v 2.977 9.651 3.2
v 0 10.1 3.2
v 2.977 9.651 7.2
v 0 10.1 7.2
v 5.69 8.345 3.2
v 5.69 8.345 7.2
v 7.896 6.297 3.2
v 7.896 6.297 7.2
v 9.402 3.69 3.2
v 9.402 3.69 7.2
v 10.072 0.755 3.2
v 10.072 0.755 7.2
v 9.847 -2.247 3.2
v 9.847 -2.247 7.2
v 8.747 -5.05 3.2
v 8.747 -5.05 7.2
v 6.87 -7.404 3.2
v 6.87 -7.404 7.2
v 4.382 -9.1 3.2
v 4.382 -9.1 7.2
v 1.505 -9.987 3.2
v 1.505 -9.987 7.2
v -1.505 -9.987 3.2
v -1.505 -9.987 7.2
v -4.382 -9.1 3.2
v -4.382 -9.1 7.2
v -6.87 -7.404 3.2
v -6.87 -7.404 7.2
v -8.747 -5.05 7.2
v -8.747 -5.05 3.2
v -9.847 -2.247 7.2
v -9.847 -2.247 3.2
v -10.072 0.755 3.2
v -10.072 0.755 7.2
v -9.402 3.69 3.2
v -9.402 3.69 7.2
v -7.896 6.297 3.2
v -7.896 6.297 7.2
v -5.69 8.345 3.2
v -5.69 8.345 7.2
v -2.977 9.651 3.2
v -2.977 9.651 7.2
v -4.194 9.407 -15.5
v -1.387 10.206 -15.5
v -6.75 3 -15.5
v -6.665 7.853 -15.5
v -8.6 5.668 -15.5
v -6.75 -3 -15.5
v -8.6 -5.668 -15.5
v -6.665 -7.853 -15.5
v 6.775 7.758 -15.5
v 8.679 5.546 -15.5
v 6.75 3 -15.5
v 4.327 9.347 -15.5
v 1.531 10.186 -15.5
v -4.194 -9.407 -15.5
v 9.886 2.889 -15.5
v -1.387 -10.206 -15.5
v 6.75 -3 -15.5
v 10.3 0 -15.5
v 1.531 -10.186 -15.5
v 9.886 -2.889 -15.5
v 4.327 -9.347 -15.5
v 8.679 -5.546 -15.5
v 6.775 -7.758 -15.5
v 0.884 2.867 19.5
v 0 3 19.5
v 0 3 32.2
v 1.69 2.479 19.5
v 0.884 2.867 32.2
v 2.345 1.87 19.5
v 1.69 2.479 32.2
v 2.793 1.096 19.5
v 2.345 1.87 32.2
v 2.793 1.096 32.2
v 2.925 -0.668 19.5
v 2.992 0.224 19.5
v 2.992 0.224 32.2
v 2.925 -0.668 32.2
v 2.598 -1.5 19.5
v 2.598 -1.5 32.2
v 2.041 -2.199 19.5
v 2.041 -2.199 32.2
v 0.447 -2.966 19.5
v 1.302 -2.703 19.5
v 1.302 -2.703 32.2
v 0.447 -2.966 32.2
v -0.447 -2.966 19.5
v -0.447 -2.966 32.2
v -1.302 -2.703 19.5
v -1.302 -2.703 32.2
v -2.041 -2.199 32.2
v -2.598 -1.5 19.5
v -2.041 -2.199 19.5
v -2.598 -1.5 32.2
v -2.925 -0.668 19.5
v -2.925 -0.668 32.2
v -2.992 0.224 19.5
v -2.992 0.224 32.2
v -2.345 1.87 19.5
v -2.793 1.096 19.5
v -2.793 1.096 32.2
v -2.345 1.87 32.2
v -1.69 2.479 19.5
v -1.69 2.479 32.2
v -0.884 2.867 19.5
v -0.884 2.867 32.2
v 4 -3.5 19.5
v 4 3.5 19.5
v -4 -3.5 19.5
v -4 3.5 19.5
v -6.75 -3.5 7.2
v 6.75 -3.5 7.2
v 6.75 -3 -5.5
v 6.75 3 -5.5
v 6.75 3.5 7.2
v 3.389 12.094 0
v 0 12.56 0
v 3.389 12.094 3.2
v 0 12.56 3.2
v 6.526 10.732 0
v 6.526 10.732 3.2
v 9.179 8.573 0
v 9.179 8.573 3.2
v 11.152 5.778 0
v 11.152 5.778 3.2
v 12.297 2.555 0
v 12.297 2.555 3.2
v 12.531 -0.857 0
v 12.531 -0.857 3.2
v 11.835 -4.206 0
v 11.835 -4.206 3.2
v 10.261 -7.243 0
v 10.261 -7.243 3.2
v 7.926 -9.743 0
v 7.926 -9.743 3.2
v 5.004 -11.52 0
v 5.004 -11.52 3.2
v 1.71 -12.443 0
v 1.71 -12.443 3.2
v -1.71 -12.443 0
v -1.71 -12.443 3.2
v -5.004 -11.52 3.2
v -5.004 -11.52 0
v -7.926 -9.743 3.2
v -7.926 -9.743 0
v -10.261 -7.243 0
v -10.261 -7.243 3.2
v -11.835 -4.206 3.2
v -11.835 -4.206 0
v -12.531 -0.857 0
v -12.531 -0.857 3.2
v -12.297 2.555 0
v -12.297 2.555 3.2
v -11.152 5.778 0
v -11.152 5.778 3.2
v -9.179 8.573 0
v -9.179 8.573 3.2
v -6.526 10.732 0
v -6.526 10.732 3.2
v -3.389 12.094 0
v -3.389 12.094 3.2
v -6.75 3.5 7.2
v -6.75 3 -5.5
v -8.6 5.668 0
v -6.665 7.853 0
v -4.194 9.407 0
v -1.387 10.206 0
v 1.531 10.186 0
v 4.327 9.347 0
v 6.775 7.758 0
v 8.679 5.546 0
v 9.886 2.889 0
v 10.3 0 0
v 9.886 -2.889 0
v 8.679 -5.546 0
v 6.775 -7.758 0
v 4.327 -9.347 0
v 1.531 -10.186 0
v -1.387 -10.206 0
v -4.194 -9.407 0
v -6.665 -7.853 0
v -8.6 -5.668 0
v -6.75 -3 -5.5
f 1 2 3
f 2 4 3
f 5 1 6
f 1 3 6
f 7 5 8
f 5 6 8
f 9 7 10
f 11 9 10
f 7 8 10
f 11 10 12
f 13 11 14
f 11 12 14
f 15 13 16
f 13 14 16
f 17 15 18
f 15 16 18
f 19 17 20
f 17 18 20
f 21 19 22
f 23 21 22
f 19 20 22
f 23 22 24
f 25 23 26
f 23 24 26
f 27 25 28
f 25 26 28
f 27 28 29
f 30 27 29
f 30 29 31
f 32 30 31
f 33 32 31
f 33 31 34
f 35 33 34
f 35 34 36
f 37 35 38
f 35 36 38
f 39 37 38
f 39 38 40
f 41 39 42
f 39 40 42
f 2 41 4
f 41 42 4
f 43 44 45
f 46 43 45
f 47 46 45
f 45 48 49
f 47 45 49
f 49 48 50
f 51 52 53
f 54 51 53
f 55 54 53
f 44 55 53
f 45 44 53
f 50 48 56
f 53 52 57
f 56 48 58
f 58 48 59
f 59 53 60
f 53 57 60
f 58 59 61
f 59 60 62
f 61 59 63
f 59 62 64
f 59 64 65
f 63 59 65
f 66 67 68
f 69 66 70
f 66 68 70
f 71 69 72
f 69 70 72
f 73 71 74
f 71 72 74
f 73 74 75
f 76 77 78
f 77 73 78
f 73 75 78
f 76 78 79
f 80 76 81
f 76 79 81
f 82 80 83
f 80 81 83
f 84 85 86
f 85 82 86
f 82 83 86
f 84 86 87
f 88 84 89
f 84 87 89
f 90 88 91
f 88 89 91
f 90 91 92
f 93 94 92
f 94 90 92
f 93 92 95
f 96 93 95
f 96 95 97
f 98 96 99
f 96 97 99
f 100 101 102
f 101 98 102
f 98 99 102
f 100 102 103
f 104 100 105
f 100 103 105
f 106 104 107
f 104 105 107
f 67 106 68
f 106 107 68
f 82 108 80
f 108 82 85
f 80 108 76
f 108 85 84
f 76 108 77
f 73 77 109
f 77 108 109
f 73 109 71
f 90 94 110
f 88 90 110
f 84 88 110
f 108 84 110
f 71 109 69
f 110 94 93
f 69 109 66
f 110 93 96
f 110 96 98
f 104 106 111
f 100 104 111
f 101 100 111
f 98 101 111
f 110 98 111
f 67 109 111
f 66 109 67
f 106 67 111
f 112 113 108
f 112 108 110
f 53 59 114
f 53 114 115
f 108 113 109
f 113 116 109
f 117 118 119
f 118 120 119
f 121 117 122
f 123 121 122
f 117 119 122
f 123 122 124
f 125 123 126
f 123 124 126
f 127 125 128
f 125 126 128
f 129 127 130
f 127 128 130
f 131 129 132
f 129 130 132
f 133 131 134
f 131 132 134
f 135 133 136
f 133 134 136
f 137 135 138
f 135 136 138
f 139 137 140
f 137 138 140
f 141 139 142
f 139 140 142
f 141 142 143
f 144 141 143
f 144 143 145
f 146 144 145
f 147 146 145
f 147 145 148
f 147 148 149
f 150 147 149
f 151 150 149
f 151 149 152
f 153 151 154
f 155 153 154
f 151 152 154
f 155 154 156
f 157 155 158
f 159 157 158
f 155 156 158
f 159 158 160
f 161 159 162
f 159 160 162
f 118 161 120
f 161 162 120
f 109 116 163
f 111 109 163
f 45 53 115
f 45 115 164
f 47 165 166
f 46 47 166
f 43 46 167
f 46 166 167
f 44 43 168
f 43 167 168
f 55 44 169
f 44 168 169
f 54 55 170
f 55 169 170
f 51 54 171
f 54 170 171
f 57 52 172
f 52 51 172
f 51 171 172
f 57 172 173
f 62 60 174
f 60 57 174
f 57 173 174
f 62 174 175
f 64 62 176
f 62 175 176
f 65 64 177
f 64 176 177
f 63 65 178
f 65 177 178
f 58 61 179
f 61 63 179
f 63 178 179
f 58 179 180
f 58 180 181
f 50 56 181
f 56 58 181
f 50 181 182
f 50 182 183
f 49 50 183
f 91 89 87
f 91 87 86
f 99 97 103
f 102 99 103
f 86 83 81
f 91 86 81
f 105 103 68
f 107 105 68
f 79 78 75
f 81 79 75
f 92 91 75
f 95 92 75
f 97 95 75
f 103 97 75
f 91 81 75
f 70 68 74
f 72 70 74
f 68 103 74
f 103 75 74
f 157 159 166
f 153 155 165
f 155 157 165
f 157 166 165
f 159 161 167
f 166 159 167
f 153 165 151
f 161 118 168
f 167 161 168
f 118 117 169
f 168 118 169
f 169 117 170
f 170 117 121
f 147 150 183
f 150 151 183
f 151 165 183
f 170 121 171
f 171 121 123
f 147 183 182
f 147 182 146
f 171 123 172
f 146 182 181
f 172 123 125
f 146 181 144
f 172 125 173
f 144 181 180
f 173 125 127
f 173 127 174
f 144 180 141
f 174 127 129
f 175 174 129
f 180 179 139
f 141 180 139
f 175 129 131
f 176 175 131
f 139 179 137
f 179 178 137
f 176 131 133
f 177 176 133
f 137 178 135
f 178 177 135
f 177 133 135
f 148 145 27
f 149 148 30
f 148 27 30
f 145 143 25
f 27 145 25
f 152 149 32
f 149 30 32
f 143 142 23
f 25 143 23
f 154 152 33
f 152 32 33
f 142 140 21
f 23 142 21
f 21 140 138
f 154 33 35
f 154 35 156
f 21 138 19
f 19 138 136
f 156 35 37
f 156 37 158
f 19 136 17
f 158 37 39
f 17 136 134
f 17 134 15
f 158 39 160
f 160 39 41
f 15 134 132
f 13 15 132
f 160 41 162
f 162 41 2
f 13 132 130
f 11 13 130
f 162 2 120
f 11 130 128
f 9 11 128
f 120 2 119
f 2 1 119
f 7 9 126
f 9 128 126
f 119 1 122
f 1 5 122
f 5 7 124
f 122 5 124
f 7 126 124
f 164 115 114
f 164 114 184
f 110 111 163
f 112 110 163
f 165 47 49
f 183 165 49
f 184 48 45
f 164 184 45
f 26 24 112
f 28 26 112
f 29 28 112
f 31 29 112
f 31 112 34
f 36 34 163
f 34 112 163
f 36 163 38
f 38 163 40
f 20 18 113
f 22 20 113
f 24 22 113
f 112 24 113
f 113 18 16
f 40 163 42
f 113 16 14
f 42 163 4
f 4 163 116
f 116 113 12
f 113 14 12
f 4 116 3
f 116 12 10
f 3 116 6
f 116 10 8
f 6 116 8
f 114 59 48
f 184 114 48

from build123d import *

# Parameters (mm, degrees)
BOSS_EXTRUDE1_DEPTH = 3.5
SKETCH3_W           = 13.5
SKETCH3_H           = 6
CUT_EXTRUDE1_DEPTH  = 10
CUT_EXTRUDE2_DEPTH  = 15.5


with BuildPart() as part:
    # Sketch1 → Revolve1 (revolve)
    with BuildSketch(Plane(origin=(0, 0, 0), x_dir=(0, 0, -1), z_dir=(1, 0, 0))):
        Polygon((-32.2, 0), (15.5, 0), (15.5, 10.3), (0, 10.3), (0, 12.56), (-3.2, 12.56), (-3.2, 10.1), (-7.2, 10.1), (-7.2, 3), (-32.2, 3), align=None)
    revolve(axis=Axis((0, 0, -15.5), (0, 0, -1)))

    # Sketch2 → Boss-Extrude1 (add, symmetric)
    with BuildSketch(Plane(origin=(0, 0, 0), x_dir=(1, 0, 0), z_dir=(0, 1, 0))):
        Polygon((-6.75, -7.2), (6.75, -7.2), (4, -19.5), (-4, -19.5), align=None)
    extrude(amount=BOSS_EXTRUDE1_DEPTH, both=True)

    # Sketch3 → Cut-Extrude1 (cut)
    with BuildSketch(Plane(origin=(0, 0, -15.5), x_dir=(-1, 0, 0), z_dir=(0, 0, -1))):
        Rectangle(SKETCH3_W, SKETCH3_H)
    extrude(amount=-CUT_EXTRUDE1_DEPTH, mode=Mode.SUBTRACT)

    # Sketch4 → Cut-Extrude2 (cut)
    with BuildSketch(Plane(origin=(0, 0, -15.5), x_dir=(-1, 0, 0), z_dir=(0, 0, -1))):
        with BuildLine():
            Line((8.6, 5.668333088), (8.6, -5.668333088))
            ThreePointArc((8.6, -5.668333088), (10.3, 0), (8.6, 5.668333088))
        make_face()
    extrude(amount=-CUT_EXTRUDE2_DEPTH, mode=Mode.SUBTRACT)


solid = part.part
